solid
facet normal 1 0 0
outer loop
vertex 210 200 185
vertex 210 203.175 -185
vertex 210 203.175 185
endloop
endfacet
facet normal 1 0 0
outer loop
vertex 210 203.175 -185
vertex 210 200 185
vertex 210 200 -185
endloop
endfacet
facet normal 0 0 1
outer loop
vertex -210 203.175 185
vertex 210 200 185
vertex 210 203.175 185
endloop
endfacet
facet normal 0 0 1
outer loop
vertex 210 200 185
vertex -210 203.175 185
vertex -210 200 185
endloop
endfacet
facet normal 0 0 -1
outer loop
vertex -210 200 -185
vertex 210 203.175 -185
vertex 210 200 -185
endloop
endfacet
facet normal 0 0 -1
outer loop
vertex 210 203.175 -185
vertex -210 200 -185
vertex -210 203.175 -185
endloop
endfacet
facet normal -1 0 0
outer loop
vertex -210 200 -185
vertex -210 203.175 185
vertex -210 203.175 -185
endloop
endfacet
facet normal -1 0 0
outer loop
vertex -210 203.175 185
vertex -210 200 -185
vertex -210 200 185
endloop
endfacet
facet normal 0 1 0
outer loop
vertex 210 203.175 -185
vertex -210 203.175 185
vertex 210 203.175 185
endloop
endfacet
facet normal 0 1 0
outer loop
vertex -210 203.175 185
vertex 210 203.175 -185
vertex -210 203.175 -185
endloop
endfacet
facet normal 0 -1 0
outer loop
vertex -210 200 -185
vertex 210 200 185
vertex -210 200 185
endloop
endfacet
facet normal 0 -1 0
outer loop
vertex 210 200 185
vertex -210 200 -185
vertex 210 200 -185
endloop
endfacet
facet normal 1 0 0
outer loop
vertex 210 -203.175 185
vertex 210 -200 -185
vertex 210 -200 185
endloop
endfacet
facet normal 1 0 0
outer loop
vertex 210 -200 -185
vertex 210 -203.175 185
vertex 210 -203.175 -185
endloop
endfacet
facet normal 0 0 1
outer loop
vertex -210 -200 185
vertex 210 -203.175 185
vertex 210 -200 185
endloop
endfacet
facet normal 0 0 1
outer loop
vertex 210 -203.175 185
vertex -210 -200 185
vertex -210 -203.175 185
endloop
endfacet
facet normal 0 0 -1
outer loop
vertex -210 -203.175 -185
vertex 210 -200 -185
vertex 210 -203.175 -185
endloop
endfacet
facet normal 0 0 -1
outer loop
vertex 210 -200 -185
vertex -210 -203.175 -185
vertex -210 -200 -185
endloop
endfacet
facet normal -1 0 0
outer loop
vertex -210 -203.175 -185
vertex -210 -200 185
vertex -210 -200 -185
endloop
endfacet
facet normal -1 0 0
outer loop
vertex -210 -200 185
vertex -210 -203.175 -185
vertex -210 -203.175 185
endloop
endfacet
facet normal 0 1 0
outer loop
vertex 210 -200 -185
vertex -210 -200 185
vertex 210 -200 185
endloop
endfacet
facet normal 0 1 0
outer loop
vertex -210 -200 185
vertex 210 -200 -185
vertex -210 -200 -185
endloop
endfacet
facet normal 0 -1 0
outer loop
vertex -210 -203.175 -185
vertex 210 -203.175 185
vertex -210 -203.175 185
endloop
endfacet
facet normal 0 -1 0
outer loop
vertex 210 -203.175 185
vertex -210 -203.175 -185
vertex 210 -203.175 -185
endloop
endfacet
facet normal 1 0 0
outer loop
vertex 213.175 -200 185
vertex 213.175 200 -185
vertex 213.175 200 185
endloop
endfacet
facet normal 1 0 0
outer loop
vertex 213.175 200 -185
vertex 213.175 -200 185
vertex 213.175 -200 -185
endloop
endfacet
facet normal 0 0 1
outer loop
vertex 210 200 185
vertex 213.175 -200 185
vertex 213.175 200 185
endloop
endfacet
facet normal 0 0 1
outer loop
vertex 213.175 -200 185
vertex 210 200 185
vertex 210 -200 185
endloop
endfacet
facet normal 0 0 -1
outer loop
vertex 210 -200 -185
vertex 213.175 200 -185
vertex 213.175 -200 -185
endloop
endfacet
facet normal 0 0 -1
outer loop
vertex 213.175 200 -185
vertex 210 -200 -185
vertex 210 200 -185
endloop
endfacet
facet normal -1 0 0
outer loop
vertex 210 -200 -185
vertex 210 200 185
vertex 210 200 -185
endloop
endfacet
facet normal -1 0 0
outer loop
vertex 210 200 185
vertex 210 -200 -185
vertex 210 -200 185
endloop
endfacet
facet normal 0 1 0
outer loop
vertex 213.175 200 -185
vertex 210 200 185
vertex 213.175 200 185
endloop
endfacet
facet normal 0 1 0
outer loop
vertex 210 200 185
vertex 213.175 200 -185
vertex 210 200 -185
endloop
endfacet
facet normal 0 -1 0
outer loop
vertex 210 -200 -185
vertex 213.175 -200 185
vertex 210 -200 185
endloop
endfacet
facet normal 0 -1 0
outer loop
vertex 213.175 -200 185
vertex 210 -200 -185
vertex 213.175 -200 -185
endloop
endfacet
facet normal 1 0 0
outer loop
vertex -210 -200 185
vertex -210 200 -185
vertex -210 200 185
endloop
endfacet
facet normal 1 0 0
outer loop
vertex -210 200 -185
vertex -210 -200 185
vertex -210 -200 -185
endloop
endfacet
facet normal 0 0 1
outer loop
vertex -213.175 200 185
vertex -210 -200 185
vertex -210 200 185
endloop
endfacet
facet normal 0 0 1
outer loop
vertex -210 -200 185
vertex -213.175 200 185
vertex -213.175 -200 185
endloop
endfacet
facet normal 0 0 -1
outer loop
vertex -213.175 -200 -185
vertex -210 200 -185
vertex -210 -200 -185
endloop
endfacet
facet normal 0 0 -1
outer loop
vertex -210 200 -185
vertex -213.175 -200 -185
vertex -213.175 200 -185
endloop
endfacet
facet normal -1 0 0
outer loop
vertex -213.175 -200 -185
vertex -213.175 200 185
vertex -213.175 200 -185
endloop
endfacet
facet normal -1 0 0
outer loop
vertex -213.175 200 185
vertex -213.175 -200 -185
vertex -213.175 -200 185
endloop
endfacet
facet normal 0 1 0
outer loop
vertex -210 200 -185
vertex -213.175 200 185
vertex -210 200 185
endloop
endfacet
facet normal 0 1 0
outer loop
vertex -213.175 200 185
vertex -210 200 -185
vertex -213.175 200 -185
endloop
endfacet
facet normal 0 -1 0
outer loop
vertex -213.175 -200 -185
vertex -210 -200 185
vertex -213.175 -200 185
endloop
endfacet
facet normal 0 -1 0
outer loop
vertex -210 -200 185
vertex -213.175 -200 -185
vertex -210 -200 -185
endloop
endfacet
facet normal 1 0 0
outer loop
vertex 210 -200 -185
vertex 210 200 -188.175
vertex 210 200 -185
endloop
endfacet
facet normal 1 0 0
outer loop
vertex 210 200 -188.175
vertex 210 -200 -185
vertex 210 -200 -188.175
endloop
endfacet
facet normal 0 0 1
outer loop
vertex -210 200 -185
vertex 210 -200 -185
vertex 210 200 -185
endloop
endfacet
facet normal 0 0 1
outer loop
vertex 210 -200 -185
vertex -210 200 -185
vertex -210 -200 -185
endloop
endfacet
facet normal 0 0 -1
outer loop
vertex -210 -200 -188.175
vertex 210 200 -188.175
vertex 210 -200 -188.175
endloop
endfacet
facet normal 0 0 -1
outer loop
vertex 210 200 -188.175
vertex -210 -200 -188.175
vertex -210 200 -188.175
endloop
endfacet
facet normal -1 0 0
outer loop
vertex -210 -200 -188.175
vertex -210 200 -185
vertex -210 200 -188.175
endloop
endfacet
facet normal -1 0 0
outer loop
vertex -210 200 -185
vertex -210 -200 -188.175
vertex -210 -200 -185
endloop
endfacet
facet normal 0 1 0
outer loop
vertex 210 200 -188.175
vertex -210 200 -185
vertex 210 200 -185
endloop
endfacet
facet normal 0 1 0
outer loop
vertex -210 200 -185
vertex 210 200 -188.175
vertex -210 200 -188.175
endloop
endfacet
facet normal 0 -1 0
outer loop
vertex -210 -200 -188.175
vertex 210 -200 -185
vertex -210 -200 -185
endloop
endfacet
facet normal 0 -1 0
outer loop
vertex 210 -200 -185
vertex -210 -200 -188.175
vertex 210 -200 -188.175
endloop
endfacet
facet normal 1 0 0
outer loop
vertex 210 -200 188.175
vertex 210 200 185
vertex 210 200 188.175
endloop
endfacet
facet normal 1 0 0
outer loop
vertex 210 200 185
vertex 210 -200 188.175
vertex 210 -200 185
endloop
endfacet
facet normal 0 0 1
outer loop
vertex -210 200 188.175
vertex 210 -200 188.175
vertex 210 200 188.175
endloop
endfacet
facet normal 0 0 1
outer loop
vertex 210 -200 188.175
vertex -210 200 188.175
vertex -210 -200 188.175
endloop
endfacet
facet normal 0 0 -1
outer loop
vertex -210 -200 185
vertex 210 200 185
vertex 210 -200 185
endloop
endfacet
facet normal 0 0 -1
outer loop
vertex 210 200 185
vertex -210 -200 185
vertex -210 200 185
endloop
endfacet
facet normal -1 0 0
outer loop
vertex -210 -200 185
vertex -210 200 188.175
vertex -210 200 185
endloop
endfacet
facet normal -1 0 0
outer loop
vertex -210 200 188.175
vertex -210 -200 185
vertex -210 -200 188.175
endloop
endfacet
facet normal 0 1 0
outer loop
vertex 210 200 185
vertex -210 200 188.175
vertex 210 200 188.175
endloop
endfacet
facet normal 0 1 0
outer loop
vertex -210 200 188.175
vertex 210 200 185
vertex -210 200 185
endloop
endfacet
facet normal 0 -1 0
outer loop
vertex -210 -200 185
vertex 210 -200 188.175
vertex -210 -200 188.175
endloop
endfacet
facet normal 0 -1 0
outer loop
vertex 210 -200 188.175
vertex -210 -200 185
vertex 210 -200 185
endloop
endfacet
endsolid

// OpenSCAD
//Enclosure for Prusa Mendel i3
//Plate frame

width = 420;
height = 370;
depth = 400;
//1/8" plexiglass
thickness = 3.175; 

//front wall
translate([0, depth/2+thickness/2, 0])
cube([width, thickness, height], center=true);

//back wall
translate([0, -depth/2-thickness/2, 0])
cube([width, thickness, height], center=true);

//left wall
translate([width/2+thickness/2, 0, 0])
cube([thickness, depth, height], center=true);

//right wall
translate([-width/2-thickness/2, 0, 0])
cube([thickness, depth, height], center=true);

//bottom
translate([0, 0, -height/2-thickness/2])
cube([width, depth, thickness], center=true);

//top
translate([0, 0, height/2+thickness/2])
cube([width, depth, thickness], center=true);
